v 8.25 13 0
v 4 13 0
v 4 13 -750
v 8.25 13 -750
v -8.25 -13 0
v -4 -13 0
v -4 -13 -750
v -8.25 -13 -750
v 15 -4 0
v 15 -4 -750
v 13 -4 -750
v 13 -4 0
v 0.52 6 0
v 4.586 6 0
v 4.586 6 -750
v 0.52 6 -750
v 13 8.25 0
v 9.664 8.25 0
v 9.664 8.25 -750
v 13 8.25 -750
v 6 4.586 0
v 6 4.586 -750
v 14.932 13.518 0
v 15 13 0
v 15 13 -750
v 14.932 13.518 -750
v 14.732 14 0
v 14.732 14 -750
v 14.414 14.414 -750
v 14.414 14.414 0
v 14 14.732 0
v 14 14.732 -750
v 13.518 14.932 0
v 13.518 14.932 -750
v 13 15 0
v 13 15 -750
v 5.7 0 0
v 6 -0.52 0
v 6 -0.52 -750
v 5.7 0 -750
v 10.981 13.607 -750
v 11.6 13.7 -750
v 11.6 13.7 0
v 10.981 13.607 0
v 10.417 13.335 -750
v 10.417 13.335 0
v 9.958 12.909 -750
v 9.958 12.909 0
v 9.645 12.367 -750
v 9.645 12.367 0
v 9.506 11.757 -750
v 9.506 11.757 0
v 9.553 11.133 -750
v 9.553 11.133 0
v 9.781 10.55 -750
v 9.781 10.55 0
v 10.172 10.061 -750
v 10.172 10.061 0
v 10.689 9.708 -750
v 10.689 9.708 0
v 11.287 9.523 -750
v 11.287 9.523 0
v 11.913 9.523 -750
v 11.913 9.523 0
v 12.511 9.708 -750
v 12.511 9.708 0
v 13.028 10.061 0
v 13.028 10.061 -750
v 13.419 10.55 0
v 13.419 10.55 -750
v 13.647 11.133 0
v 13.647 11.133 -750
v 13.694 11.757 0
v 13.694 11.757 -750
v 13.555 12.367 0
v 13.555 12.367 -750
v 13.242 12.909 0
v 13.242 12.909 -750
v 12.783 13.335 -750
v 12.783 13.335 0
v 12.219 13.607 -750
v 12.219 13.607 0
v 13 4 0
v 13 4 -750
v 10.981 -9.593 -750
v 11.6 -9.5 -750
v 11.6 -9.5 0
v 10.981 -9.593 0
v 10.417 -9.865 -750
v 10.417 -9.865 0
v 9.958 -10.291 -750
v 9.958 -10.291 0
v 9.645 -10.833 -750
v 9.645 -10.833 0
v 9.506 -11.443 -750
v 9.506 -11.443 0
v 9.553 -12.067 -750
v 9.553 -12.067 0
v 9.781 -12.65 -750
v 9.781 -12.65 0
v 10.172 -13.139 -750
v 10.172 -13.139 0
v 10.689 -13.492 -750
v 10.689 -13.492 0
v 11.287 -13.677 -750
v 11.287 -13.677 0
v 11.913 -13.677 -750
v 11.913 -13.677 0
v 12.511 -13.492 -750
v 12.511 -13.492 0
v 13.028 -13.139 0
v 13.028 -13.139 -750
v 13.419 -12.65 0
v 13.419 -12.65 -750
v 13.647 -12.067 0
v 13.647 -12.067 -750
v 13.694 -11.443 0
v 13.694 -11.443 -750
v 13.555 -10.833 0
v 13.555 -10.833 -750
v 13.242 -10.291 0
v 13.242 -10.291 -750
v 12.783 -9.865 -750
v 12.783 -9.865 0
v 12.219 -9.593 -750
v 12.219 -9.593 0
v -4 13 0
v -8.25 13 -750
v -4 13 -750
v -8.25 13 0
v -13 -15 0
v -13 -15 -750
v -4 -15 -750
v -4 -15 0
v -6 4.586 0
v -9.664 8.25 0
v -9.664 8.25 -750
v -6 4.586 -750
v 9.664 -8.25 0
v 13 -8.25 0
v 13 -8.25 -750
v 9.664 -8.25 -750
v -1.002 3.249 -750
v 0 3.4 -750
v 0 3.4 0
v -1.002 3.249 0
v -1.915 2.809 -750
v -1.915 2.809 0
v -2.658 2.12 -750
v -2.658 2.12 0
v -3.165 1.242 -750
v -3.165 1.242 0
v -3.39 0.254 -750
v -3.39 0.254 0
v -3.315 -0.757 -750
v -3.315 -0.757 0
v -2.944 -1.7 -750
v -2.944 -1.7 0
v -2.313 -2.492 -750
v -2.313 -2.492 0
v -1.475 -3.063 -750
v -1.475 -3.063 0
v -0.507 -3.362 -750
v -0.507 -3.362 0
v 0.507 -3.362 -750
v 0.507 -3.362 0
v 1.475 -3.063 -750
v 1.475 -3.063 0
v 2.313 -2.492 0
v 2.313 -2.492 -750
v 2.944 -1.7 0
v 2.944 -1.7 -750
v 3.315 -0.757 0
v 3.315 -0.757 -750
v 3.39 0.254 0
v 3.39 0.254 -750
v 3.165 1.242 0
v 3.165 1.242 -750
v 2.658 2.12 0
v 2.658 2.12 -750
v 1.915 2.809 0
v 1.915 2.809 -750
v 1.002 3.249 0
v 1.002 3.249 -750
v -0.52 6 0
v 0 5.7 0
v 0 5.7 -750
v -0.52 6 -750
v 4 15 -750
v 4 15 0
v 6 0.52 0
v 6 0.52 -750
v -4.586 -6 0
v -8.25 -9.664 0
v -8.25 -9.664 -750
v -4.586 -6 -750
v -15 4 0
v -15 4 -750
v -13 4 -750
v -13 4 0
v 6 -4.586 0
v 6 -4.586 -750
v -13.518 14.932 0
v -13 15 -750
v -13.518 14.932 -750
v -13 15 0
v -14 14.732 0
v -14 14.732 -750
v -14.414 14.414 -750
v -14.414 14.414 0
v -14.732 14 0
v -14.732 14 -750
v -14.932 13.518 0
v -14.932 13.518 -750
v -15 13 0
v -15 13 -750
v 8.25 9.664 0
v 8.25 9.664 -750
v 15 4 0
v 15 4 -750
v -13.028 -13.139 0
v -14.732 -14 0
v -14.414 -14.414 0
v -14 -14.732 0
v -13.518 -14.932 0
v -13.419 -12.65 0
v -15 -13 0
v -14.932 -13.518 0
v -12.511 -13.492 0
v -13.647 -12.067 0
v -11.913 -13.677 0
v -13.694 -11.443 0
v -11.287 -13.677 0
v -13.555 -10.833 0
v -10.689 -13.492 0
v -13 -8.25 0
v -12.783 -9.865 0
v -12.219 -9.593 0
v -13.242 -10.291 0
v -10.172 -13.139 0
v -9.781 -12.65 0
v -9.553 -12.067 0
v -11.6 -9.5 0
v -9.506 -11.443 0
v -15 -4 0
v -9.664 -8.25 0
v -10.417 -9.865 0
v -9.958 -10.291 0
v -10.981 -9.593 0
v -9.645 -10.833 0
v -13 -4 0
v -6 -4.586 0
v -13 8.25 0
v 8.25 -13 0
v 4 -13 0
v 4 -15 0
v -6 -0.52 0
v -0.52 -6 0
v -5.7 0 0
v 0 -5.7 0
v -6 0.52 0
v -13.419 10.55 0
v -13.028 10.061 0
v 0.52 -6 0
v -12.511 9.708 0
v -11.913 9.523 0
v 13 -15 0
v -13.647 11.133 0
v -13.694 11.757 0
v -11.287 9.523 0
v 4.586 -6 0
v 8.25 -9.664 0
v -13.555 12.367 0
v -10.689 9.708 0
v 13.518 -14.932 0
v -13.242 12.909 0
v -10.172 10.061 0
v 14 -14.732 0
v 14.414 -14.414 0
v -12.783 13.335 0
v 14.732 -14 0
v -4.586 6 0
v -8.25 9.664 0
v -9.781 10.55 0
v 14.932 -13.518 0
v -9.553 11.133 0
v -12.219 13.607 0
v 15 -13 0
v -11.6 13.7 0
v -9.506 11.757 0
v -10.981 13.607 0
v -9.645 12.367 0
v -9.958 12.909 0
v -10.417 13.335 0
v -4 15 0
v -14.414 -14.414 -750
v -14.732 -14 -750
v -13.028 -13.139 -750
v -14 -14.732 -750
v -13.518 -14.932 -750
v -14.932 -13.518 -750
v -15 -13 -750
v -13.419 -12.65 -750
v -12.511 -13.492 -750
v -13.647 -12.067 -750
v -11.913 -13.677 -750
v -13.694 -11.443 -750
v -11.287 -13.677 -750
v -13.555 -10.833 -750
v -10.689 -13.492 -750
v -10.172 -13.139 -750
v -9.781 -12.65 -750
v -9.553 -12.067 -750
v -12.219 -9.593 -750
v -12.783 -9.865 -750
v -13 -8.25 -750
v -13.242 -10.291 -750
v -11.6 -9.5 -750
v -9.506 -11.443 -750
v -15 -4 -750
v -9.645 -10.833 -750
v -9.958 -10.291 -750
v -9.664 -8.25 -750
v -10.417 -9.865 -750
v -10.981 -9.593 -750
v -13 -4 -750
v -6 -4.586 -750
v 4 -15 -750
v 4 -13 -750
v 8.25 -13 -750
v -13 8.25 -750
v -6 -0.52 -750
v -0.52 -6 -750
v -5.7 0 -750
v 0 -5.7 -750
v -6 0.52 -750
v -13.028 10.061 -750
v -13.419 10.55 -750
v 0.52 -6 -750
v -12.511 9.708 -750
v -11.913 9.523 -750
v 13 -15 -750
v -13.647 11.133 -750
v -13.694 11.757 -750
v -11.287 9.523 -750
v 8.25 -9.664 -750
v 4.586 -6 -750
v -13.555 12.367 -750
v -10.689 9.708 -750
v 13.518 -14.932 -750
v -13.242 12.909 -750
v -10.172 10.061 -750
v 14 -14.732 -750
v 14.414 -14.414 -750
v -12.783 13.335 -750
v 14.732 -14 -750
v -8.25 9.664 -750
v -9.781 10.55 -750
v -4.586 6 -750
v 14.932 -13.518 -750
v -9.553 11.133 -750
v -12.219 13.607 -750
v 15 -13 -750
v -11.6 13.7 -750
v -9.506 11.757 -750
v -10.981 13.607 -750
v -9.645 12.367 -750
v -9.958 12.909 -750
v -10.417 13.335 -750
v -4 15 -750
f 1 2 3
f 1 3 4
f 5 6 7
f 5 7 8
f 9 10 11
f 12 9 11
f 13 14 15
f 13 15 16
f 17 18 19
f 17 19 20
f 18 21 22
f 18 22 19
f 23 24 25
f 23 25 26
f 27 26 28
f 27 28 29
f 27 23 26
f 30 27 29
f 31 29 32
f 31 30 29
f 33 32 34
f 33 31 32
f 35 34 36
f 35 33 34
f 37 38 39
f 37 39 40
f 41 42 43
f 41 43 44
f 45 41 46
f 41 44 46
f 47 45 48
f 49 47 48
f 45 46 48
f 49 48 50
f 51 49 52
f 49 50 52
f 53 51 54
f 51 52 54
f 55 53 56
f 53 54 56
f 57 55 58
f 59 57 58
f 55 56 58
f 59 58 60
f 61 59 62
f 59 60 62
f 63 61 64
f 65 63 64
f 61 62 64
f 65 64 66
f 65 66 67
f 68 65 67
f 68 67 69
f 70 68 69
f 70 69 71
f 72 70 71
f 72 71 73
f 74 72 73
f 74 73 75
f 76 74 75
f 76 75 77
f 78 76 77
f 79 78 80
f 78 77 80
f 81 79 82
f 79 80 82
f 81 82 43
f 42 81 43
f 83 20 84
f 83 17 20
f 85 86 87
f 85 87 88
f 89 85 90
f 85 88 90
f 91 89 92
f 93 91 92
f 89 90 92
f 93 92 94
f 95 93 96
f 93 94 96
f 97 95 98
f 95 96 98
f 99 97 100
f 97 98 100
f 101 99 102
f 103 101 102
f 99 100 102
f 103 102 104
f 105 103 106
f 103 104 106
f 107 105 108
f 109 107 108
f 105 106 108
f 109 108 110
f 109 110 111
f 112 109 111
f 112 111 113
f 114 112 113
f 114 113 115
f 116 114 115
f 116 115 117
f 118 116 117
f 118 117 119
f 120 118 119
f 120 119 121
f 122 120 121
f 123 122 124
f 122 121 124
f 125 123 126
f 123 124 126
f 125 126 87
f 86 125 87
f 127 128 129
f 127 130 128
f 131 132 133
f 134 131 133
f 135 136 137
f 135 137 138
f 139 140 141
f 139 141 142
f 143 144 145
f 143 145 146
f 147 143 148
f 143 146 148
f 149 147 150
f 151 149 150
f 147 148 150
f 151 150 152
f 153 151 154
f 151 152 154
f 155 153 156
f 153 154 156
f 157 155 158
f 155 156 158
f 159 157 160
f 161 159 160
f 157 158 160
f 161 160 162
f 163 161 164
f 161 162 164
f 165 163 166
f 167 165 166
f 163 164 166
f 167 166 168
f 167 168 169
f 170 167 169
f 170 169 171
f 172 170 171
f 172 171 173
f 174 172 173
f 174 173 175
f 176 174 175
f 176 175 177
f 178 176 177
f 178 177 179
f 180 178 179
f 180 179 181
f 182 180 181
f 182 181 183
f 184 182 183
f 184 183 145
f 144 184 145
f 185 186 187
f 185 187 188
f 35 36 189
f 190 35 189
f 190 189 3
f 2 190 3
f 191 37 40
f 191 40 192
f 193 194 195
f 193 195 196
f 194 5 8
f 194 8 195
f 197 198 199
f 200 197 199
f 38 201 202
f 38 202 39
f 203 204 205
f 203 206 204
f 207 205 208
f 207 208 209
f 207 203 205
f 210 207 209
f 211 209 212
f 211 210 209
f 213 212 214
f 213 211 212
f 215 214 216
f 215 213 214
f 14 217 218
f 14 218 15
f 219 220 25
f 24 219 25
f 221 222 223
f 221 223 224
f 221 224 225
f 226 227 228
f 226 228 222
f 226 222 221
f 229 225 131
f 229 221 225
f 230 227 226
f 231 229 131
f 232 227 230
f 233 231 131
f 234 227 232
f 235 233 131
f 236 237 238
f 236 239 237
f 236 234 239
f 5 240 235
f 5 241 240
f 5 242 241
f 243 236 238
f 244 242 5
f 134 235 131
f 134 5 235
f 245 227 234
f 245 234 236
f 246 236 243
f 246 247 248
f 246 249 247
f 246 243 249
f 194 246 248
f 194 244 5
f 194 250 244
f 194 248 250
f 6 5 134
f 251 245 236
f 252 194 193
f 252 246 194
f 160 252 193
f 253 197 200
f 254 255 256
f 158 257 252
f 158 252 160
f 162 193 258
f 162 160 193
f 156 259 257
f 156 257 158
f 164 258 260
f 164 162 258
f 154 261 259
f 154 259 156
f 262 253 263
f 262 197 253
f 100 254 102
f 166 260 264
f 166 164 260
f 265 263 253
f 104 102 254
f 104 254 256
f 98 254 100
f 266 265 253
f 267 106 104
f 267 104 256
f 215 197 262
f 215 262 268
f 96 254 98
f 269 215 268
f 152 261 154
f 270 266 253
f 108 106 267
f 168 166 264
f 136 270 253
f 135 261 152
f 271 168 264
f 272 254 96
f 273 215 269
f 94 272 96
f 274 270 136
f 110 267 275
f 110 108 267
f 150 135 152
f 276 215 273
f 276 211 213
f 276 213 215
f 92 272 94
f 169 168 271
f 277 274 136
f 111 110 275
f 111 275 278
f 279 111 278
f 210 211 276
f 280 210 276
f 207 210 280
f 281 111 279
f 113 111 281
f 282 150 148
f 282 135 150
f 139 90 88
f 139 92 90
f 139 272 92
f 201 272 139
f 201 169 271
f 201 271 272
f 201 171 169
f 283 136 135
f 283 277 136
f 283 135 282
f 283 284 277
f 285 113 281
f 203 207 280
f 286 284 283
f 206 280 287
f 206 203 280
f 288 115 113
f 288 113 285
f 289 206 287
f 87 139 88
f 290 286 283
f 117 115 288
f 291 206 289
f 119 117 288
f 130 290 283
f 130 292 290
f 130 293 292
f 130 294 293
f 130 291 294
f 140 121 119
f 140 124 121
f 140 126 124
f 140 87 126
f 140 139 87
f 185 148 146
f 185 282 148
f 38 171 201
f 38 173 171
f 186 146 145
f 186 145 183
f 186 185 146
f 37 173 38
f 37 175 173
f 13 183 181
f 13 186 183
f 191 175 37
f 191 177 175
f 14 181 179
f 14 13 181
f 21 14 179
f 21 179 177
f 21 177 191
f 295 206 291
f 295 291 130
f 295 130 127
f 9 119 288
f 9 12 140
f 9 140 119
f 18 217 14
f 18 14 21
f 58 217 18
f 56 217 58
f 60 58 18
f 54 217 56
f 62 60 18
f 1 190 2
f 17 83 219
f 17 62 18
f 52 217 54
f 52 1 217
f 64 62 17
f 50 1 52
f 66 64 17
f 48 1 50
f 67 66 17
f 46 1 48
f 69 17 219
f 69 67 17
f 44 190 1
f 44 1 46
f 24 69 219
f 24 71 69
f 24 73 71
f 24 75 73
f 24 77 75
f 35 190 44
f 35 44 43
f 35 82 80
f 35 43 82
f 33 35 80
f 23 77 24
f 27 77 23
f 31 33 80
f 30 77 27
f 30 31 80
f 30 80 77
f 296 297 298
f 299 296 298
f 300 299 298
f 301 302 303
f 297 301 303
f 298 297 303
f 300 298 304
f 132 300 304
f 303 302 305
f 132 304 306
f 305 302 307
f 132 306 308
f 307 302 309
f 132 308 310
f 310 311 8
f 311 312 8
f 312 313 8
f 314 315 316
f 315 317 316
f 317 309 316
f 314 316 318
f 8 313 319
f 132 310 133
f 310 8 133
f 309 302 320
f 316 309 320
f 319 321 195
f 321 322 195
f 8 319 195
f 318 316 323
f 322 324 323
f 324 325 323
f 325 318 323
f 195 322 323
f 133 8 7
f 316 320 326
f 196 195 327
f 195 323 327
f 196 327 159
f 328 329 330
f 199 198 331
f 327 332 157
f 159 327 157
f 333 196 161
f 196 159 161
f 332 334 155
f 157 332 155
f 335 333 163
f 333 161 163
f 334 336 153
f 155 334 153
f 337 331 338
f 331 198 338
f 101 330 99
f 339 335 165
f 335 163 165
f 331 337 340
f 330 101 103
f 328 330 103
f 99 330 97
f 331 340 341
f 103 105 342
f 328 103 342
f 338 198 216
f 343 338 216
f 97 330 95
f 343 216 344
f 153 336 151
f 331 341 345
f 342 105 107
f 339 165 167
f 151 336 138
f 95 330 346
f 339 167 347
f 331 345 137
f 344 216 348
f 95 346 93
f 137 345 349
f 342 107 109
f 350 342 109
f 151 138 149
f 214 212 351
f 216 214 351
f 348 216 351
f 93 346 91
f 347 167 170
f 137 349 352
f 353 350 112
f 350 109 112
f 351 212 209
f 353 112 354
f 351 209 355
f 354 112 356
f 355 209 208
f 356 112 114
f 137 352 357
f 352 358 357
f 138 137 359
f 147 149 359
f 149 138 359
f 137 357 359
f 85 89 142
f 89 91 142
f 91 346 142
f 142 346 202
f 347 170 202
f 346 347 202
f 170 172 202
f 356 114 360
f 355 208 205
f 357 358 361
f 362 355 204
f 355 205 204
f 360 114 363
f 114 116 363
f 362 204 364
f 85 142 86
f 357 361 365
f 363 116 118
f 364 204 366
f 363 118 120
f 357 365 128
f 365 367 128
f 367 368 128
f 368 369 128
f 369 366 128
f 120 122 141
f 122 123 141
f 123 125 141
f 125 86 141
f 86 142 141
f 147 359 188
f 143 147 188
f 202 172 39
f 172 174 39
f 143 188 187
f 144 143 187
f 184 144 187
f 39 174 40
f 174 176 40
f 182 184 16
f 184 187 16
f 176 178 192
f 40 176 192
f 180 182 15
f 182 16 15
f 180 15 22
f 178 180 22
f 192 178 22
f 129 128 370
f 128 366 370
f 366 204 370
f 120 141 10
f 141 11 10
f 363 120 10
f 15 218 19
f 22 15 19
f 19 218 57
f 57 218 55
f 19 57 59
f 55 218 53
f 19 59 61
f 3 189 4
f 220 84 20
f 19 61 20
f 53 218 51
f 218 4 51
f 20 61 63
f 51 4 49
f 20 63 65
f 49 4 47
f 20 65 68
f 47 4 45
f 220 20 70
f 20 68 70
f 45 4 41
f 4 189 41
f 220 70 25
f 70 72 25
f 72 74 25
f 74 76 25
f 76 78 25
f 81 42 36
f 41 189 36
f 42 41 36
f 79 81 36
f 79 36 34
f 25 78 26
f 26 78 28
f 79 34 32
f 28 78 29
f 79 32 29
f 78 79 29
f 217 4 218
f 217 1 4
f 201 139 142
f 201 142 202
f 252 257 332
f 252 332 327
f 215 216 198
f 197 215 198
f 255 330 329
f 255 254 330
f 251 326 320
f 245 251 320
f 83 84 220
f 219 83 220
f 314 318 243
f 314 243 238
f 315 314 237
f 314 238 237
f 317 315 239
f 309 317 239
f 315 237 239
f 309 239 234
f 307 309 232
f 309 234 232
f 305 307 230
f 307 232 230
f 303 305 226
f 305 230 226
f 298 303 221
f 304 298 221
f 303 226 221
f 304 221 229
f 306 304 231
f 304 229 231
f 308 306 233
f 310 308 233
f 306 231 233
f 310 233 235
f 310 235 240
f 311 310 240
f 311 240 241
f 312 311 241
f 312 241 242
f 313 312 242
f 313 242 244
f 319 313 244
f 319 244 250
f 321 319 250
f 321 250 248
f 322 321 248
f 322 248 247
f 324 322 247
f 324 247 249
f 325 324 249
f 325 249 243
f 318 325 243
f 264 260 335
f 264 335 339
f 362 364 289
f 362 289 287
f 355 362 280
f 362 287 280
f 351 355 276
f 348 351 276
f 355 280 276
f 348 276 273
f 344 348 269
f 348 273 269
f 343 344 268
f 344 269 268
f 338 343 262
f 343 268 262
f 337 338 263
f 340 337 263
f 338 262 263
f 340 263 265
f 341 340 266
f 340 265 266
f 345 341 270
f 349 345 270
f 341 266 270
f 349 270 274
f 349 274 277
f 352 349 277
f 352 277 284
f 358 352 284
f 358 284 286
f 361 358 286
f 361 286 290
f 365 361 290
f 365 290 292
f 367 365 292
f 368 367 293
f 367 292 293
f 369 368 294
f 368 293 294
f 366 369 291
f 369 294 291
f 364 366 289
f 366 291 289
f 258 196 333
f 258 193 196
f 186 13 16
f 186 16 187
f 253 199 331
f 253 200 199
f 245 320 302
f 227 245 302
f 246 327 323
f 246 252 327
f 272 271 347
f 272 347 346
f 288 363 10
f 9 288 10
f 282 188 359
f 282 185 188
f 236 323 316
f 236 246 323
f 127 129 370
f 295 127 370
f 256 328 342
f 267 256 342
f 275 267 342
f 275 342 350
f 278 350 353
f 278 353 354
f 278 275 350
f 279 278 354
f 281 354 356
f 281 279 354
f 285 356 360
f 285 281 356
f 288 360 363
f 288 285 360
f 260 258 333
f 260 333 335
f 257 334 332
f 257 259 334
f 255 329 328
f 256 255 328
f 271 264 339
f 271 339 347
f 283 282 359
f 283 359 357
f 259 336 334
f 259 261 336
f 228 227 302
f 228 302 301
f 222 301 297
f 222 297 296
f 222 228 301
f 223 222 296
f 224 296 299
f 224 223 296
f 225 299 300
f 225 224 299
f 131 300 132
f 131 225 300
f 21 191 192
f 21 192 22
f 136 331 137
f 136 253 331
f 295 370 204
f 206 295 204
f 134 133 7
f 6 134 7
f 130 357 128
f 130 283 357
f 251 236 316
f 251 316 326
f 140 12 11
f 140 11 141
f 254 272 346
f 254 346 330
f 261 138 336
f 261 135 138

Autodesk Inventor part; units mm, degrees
sketch "Sketch_1" plane through (0, 0, 0) normal (0, 0, 1) x (1, 0, 0)
  line L0 (-15, 4) -> (-13, 4)
  line L1 (-13, 4) -> (-13, 8.25)
  line L2 (-13, 8.25) -> (-9.6642, 8.25)
  line L3 (-9.6642, 8.25) -> (-6, 4.5858)
  line L4 (-6, 4.5858) -> (-6, 0.5196)
  line L5 (-6, 0.5196) -> (-5.7, 0)
  line L6 (-5.7, 0) -> (-6, -0.5196)
  line L7 (-6, -0.5196) -> (-6, -4.5858)
  line L8 (-6, -4.5858) -> (-9.6642, -8.25)
  line L9 (-9.6642, -8.25) -> (-13, -8.25)
  line L10 (-13, -8.25) -> (-13, -4)
  line L11 (-13, -4) -> (-15, -4)
  line L12 (-15, -4) -> (-15, -13)
  arc A0 (-15, -13) -> (-13, -15) centre (-13, -13) ccw
  line L13 (-13, -15) -> (-4, -15)
  line L14 (-4, -15) -> (-4, -13)
  line L15 (-4, -13) -> (-8.25, -13)
  line L16 (-8.25, -13) -> (-8.25, -9.6642)
  line L17 (-8.25, -9.6642) -> (-4.5858, -6)
  line L18 (-4.5858, -6) -> (-0.5196, -6)
  line L19 (-0.5196, -6) -> (0, -5.7)
  line L20 (0, -5.7) -> (0.5196, -6)
  line L21 (0.5196, -6) -> (4.5858, -6)
  line L22 (4.5858, -6) -> (8.25, -9.6642)
  line L23 (8.25, -9.6642) -> (8.25, -13)
  line L24 (8.25, -13) -> (4, -13)
  line L25 (4, -13) -> (4, -15)
  line L26 (4, -15) -> (13, -15)
  arc A1 (13, -15) -> (15, -13) centre (13, -13) ccw
  line L27 (15, -13) -> (15, -4)
  line L28 (15, -4) -> (13, -4)
  line L29 (13, -4) -> (13, -8.25)
  line L30 (13, -8.25) -> (9.6642, -8.25)
  line L31 (9.6642, -8.25) -> (6, -4.5858)
  line L32 (6, -4.5858) -> (6, -0.5196)
  line L33 (6, -0.5196) -> (5.7, 0)
  line L34 (5.7, 0) -> (6, 0.5196)
  line L35 (6, 0.5196) -> (6, 4.5858)
  line L36 (6, 4.5858) -> (9.6642, 8.25)
  line L37 (9.6642, 8.25) -> (13, 8.25)
  line L38 (13, 8.25) -> (13, 4)
  line L39 (13, 4) -> (15, 4)
  line L40 (15, 4) -> (15, 13)
  arc A2 (15, 13) -> (13, 15) centre (13, 13) ccw
  line L41 (13, 15) -> (4, 15)
  line L42 (4, 15) -> (4, 13)
  line L43 (4, 13) -> (8.25, 13)
  line L44 (8.25, 13) -> (8.25, 9.6642)
  line L45 (8.25, 9.6642) -> (4.5858, 6)
  line L46 (4.5858, 6) -> (0.5196, 6)
  line L47 (0.5196, 6) -> (0, 5.7)
  line L48 (0, 5.7) -> (-0.5196, 6)
  line L49 (-0.5196, 6) -> (-4.5858, 6)
  line L50 (-4.5858, 6) -> (-8.25, 9.6642)
  line L51 (-8.25, 9.6642) -> (-8.25, 13)
  line L52 (-8.25, 13) -> (-4, 13)
  line L53 (-4, 13) -> (-4, 15)
  line L54 (-4, 15) -> (-13, 15)
  arc A3 (-13, 15) -> (-15, 13) centre (-13, 13) ccw
  line L55 (-15, 13) -> (-15, 4)
extrude "Extrusion1" add sketch "Sketch_1" against normal blind 750
sketch "Sketch2" plane through (0, 0, -750) normal (0, 0, -1) x (-1, 0, 0)
  point P0 (0, 0)
hole "Hole1" at (0, 0, -750) direction (0, 0, 1) diameter 6.8 depth 750
sketch "Sketch3" plane through (0, 0, -750) normal (0, 0, -1) x (-1, 0, 0)
  point P0 (-11.6, 11.6)
hole "Hole2" at (11.6, 11.6, -750) direction (0, 0, 1) diameter 4.2 depth 750
pattern_linear "Rectangular Pattern1" count 2 spacing 23.2 along (-1, 0, 0) count 2 spacing 23.2 along (0, -1, 0) of "Hole2"
ref_plane "C1_XY" through (0, 0, 0) normal (0, 0, 1) x (1, 0, 0)
ref_plane "C1_YZ" through (0, 0, 0) normal (1, 0, 0) x (0, 1, 0)
ref_plane "C1_ZX" through (0, 0, 0) normal (0, 1, 0) x (0, 0, 1)
ref_plane "to_frame_cap1_XY" through (0, 0, 0) normal (0, 0, 1) x (1, 0, 0)
ref_plane "to_frame_cap1_YZ" through (0, 0, 0) normal (1, 0, 0) x (0, 1, 0)
ref_plane "to_frame_cap1_ZX" through (0, 0, 0) normal (0, 1, 0) x (0, 0, 1)
ref_plane "to_frame_cap2_XY" through (0, 0, -750) normal (0, 0, -1) x (1, 0, 0)
ref_plane "to_frame_cap2_YZ" through (0, 0, -750) normal (1, 0, 0) x (0, -1, 0)
ref_plane "to_frame_cap2_ZX" through (0, 0, -750) normal (0, -1, 0) x (0, 0, -1)
properties part number "HFS6-3030-750"
